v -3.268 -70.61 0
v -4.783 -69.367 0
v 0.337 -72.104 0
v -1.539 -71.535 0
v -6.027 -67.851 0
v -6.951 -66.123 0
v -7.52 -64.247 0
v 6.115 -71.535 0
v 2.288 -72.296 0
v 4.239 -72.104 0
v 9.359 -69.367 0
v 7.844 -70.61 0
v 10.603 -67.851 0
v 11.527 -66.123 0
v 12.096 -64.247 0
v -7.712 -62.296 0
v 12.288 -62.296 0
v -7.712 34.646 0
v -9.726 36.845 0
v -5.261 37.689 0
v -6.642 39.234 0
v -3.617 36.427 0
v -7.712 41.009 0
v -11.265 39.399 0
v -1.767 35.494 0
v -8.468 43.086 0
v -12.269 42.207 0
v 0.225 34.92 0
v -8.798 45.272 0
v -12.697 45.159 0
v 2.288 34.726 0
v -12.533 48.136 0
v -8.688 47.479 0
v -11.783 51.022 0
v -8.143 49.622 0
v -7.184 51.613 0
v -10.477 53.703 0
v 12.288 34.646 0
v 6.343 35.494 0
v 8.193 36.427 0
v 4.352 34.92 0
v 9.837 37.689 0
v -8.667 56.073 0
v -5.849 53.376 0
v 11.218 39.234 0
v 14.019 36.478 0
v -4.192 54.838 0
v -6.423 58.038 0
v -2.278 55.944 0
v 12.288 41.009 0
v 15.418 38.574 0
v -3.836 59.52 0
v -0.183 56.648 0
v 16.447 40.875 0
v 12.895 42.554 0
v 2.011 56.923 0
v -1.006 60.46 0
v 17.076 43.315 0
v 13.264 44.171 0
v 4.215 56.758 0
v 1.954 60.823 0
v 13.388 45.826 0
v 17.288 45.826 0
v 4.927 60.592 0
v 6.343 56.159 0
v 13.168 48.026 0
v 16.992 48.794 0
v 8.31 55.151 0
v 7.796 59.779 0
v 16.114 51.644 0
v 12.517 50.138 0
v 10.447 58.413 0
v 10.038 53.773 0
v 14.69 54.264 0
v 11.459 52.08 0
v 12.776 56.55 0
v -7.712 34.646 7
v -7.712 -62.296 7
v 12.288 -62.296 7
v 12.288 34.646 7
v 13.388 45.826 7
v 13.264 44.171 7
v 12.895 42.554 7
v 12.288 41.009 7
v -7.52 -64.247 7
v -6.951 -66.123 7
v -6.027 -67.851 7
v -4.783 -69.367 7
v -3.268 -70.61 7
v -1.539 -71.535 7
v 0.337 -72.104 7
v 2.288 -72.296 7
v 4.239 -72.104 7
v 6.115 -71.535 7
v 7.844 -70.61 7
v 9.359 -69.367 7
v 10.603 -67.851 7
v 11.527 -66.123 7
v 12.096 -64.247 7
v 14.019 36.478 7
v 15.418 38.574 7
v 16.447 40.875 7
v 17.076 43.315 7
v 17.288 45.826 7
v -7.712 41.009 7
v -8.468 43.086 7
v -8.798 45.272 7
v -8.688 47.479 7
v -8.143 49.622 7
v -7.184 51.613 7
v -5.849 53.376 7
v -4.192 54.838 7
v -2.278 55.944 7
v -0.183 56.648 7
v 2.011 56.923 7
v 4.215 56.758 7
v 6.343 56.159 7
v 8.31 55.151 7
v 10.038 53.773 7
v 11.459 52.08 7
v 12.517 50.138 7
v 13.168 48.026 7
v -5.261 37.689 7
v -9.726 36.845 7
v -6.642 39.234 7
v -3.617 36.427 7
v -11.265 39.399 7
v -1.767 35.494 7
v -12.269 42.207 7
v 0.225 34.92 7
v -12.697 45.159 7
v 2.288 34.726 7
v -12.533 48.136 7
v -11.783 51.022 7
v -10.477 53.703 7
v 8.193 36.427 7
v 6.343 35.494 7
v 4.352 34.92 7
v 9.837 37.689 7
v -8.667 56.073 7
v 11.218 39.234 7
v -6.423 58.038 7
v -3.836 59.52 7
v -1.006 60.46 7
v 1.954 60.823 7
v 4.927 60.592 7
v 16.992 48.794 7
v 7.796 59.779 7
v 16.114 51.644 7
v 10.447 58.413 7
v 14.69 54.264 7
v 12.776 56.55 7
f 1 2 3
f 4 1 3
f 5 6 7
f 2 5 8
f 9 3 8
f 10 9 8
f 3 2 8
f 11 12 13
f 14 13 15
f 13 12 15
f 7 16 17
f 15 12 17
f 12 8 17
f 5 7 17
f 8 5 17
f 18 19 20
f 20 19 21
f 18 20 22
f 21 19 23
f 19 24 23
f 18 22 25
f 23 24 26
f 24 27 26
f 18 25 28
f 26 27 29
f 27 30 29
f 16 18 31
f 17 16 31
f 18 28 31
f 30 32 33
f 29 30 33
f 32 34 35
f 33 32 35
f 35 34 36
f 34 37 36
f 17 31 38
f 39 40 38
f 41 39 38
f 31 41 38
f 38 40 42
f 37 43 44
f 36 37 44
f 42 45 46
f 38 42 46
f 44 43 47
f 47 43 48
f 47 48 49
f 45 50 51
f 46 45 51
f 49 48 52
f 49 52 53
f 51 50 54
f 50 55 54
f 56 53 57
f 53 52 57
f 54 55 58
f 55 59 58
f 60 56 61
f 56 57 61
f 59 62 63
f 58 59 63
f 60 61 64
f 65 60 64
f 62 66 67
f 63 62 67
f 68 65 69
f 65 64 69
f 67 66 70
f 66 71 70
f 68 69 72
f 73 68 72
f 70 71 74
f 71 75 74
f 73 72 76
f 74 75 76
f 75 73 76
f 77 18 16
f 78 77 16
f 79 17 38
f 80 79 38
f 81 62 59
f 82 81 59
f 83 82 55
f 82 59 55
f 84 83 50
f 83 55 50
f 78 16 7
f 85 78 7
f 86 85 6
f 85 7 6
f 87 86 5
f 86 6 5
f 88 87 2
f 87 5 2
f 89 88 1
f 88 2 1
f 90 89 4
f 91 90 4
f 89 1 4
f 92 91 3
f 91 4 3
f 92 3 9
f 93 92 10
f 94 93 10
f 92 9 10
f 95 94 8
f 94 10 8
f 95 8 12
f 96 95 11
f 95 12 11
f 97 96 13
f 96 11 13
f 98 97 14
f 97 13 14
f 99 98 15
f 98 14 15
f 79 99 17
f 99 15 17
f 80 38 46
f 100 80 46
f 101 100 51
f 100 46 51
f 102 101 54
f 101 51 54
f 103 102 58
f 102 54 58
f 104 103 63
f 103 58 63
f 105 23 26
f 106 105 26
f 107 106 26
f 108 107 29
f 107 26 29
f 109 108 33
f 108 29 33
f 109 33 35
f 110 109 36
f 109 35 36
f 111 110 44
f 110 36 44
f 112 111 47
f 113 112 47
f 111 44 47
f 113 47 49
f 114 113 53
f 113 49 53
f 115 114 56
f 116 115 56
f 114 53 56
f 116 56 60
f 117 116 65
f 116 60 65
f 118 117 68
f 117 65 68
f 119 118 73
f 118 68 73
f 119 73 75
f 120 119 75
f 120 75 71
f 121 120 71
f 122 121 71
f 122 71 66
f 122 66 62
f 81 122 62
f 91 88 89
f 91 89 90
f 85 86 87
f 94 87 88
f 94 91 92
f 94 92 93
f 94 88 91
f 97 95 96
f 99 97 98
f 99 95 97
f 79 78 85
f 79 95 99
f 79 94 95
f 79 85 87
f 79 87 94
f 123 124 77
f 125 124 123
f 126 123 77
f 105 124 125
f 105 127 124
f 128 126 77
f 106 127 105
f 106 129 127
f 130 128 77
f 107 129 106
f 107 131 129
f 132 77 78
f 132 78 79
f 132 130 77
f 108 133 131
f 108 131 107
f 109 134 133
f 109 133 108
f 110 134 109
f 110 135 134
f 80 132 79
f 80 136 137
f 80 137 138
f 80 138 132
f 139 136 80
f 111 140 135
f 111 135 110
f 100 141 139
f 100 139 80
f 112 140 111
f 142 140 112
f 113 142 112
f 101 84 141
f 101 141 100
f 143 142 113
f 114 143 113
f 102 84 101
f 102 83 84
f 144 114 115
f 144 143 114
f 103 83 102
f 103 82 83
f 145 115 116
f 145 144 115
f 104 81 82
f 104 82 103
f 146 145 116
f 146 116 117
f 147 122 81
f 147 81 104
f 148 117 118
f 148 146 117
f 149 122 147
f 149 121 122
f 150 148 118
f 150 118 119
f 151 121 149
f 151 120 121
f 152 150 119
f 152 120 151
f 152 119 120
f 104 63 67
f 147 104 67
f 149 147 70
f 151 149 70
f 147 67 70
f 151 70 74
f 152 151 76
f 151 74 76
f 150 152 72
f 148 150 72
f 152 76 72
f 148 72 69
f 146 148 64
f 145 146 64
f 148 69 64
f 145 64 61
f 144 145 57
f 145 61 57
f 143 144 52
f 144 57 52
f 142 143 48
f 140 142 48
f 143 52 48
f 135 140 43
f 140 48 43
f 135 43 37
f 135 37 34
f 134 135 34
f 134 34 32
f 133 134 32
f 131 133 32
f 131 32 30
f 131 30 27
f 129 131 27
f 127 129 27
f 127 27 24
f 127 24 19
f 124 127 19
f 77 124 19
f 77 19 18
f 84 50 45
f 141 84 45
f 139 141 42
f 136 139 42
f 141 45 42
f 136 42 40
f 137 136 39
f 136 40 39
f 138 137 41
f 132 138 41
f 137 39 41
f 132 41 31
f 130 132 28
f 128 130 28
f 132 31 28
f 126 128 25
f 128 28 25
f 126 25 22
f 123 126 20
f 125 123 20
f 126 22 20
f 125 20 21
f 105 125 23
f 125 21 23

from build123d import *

# Parameters (mm, degrees)
F1_DEPTH = 7


with BuildPart() as f1:
    # F0 (on Top) → F1 (new body)
    with BuildSketch(Plane.XY):
        with BuildLine():
            Line((-7.7118040062, 34.6460978838), (-7.7118040062, -62.2957423329))
            ThreePointArc((-7.7118040062, -62.2957423329), (2.2881959938, -52.2957423329), (12.2881959938, -62.2957423329))
            Line((12.2881959938, -62.2957423329), (12.2881959938, 34.6460978838))
            ThreePointArc((12.2881959938, 34.6460978838), (2.2881959938, 30.8264377713), (-7.7118040062, 34.6460978838))
        make_face()
        with BuildLine():
            ThreePointArc((12.2881959938, -62.2957423329), (2.2881959938, -52.2957423329), (-7.7118040062, -62.2957423329))
            ThreePointArc((-7.7118040062, -62.2957423329), (2.2881959938, -72.2957423329), (12.2881959938, -62.2957423329))
        make_face()
        with BuildLine():
            ThreePointArc((17.2881959938, 45.8264377713), (-3.8355283632, 59.5195017089), (-7.7118040062, 34.6460978838))
            Line((-7.7118040062, 34.6460978838), (-7.7118040062, 41.0087619831))
            ThreePointArc((-7.7118040062, 41.0087619831), (-0.1826338264, 56.647944136), (13.3881959938, 45.8264377713))
            ThreePointArc((13.3881959938, 45.8264377713), (13.1097023584, 43.3556079512), (12.2881959938, 41.0087619831))
            Line((12.2881959938, 41.0087619831), (12.2881959938, 34.6460978838))
            ThreePointArc((12.2881959938, 34.6460978838), (15.9812599314, 39.7027134144), (17.2881959938, 45.8264377713))
        make_face()
        with BuildLine():
            Line((-7.7118040062, 41.0087619831), (-7.7118040062, 34.6460978838))
            ThreePointArc((-7.7118040062, 34.6460978838), (2.2881959938, 30.8264377713), (12.2881959938, 34.6460978838))
            Line((12.2881959938, 34.6460978838), (12.2881959938, 41.0087619831))
            ThreePointArc((12.2881959938, 41.0087619831), (2.2881959938, 34.7264377713), (-7.7118040062, 41.0087619831))
        make_face()
    extrude(amount=F1_DEPTH)


solid = f1.part
